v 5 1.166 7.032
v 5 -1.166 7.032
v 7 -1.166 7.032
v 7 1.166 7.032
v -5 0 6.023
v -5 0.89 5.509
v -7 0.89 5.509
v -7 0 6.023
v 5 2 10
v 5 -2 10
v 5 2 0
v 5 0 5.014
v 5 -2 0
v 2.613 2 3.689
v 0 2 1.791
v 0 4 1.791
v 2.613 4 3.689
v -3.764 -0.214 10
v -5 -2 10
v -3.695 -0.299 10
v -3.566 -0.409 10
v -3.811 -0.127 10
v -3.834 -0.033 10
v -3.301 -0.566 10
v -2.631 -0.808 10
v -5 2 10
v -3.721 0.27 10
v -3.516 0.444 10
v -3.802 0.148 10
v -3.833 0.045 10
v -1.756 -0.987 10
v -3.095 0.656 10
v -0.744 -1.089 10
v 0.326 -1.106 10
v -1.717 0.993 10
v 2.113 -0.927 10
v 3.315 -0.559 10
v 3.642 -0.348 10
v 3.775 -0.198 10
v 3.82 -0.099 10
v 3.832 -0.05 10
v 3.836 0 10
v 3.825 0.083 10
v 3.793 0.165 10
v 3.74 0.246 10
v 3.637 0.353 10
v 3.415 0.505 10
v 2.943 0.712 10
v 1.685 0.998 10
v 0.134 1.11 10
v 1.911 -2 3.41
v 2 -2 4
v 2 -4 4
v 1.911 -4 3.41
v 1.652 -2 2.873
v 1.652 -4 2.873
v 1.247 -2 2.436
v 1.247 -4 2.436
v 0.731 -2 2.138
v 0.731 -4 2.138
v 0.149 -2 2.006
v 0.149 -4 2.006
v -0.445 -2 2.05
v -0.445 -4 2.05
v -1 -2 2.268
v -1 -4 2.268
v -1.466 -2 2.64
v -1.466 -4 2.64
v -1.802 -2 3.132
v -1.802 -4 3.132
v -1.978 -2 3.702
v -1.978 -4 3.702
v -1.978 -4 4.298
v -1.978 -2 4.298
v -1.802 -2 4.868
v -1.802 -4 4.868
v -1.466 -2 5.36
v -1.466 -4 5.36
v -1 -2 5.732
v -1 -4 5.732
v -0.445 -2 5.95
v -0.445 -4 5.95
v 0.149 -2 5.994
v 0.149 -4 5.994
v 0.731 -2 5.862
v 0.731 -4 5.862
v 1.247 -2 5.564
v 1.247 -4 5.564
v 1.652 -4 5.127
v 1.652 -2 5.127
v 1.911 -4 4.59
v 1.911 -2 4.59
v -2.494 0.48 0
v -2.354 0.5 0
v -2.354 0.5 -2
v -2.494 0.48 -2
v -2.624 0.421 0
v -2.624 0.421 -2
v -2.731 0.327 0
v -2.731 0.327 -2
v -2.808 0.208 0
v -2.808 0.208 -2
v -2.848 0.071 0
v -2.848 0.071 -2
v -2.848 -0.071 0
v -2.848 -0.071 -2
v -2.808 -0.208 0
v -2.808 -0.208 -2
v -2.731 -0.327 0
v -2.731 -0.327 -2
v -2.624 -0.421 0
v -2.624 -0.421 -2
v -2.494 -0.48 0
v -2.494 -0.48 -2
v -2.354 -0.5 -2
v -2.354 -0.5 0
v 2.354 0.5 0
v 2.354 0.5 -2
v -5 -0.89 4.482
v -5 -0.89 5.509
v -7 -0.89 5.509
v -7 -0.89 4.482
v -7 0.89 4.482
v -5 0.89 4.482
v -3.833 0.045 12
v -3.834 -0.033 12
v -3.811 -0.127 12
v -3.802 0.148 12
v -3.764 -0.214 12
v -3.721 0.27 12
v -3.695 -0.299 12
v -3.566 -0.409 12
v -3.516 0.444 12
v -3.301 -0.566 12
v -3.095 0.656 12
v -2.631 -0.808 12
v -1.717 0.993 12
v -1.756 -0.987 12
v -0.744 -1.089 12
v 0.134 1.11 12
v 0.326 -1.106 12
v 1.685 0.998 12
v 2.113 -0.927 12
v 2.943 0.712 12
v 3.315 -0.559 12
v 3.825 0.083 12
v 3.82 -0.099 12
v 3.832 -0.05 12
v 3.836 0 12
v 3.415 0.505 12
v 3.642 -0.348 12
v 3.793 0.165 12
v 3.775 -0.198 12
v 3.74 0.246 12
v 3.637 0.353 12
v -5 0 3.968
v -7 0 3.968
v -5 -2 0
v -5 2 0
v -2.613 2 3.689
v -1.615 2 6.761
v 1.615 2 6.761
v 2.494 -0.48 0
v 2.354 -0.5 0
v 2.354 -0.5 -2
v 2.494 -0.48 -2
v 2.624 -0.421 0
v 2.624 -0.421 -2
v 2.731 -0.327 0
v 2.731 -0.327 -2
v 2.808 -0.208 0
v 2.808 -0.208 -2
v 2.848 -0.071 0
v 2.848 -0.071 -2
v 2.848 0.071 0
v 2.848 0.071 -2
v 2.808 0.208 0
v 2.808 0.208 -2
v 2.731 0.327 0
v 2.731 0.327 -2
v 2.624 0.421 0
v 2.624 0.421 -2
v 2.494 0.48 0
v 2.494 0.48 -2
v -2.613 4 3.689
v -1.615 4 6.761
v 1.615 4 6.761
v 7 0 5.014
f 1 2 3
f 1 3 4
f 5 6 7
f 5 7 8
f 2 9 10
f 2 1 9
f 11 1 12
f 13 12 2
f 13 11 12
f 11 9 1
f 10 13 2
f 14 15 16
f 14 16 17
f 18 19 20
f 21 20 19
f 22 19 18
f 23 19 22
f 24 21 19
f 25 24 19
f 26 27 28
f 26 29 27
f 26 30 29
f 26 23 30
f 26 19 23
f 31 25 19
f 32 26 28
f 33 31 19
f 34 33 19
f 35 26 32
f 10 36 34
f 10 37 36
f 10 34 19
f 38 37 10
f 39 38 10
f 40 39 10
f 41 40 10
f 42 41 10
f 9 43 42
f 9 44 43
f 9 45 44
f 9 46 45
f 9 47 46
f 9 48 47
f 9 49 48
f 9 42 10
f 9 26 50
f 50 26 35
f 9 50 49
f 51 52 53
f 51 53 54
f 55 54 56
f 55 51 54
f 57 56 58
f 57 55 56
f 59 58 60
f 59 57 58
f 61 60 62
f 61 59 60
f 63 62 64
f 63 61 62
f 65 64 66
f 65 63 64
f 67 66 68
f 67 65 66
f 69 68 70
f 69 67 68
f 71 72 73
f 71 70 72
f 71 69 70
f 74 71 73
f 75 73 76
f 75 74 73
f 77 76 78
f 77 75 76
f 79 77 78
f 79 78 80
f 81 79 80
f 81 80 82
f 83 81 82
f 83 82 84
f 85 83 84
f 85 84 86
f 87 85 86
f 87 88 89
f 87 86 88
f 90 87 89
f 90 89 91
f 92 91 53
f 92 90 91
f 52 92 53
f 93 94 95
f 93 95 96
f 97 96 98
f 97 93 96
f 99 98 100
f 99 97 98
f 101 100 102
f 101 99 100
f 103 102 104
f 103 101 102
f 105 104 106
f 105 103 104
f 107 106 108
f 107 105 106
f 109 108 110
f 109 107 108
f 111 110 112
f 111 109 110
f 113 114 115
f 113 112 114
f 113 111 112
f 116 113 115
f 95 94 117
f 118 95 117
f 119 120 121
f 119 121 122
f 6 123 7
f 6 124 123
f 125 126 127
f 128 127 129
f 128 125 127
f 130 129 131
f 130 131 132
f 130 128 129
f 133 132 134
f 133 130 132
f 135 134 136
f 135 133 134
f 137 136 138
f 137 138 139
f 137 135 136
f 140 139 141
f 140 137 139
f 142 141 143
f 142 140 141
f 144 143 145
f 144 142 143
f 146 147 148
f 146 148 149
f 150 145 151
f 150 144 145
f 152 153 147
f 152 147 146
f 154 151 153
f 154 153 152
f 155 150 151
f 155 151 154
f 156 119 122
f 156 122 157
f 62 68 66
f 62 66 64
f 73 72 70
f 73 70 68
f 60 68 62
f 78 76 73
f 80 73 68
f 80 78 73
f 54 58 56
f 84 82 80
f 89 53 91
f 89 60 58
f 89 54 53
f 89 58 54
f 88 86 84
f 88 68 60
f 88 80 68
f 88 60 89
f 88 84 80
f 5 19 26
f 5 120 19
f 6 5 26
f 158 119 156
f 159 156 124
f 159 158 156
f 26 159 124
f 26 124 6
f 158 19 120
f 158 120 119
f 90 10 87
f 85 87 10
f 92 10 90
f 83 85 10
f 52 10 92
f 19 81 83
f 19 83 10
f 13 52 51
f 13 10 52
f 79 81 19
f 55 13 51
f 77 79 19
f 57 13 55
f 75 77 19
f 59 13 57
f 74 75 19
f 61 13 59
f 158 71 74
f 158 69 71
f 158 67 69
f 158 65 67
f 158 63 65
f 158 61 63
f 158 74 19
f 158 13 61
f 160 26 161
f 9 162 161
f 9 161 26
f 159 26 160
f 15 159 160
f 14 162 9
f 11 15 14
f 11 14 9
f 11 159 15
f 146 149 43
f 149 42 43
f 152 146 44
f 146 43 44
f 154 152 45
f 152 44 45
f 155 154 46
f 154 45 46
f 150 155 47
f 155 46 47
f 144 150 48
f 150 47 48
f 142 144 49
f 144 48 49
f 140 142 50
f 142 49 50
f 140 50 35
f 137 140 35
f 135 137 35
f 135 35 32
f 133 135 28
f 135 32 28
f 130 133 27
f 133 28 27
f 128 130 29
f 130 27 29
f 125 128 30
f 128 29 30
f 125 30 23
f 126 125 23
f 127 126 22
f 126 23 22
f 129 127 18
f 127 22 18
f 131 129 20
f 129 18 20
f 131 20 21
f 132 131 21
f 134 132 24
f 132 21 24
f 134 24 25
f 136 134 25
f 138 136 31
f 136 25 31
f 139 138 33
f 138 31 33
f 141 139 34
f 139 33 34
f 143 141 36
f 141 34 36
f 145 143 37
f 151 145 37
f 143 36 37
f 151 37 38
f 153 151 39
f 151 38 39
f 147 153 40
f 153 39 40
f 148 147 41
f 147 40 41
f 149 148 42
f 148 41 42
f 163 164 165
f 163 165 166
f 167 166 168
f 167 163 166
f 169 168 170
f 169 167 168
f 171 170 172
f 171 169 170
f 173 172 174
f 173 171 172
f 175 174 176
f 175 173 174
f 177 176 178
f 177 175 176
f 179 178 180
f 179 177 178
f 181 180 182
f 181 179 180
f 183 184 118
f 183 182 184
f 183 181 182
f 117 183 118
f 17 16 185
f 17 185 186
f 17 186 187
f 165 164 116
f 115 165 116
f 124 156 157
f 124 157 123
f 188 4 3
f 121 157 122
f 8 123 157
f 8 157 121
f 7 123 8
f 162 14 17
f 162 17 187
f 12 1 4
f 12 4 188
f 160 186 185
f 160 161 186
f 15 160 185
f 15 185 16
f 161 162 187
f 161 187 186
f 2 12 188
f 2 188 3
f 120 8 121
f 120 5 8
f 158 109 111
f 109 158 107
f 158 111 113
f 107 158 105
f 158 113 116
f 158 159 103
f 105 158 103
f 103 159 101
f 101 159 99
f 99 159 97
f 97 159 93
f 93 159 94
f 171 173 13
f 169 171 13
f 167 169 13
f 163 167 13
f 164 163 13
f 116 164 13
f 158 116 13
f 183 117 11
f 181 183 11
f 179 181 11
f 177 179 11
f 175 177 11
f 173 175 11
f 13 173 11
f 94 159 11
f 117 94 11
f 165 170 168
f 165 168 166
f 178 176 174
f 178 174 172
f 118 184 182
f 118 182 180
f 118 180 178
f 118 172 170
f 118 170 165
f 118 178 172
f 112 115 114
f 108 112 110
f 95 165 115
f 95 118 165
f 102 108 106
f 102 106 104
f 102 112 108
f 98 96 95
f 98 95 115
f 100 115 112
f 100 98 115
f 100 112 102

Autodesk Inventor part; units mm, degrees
ref_plane "YZ Plane" through (0, 0, 0) normal (1, 0, 0) x (0, 1, 0)
ref_plane "XZ Plane" through (0, 0, 0) normal (0, 1, 0) x (-1, 0, 0)
ref_plane "XY Plane" through (0, 0, 0) normal (0, 0, 1) x (1, 0, 0)
sketch "Rechteck" plane through (0, 0, 0) normal (0, 0, 1) x (1, 0, 0)
  line L0 (-5, 2) -> (5, 2)
  line L1 (5, 2) -> (5, -2)
  line L2 (5, -2) -> (-5, -2)
  line L3 (-5, -2) -> (-5, 2)
  point P0 (0, 0)
  dimension "d0" = 5
  dimension "d1" = 10
  dimension "d2" = 4
  dimension "d3" = 2
extrude "Extrusion1" add sketch "Rechteck" along normal blind 10
sketch "Kreis" plane through (-5, -2, 0) normal (0, -1, 0) x (1, 0, 0)
  circle A0 centre (5, 4) radius 2
  point P0 (5, 0)
  dimension "d6" = 4
extrude "Extrusion2" add sketch "Kreis" along normal blind 2
sketch "Dreieck" plane through (5, -2, 0) normal (1, 0, 0) x (0, 0, -1)
  line L0 (-5.0135, 2) -> (-7.0323, 0.8344)
  line L1 (-7.0323, 0.8344) -> (-7.0323, 3.1656)
  line L2 (-7.0323, 3.1656) -> (-5.0135, 2)
  point P0 (0, 2)
  point P1 (-6.3594, 2)
extrude "Extrusion3" add sketch "Dreieck" along normal blind 2
sketch "Pentagon" plane through (-5, 2, 0) normal (0, 1, 0) x (1, 0, 0)
  line L0 (5, -1.7907) -> (7.6131, -3.6893)
  line L1 (7.6131, -3.6893) -> (6.615, -6.7612)
  line L2 (6.615, -6.7612) -> (3.385, -6.7612)
  line L3 (3.385, -6.7612) -> (2.3869, -3.6893)
  line L4 (2.3869, -3.6893) -> (5, -1.7907)
  point P0 (5, 0)
  point P1 (5, -4.5383)
extrude "Extrusion4" add sketch "Pentagon" along normal blind 2
sketch "Hexagon" plane through (-5, -2, 0) normal (-1, 0, 0) x (0, 0, 1)
  line L0 (6.0229, 2) -> (5.5093, 1.1104)
  line L1 (5.5093, 1.1104) -> (4.4821, 1.1104)
  line L2 (4.4821, 1.1104) -> (3.9685, 2)
  line L3 (3.9685, 2) -> (4.4821, 2.8896)
  line L4 (4.4821, 2.8896) -> (5.5093, 2.8896)
  line L5 (5.5093, 2.8896) -> (6.0229, 2)
  point P0 (0, 2)
  point P1 (4.9957, 2)
extrude "Extrusion5" add sketch "Hexagon" along normal blind 2
sketch "Ellipse" plane through (0, 0, 10) normal (0, 0, 1) x (1, 0, 0)
  ellipse E0 centre (0, 0) end of major axis (3.8358, 0) minor radius 1.1104
sketch "Nase" plane through (0, 0, 0) normal (0, 0, -1) x (-1, 0, 0)
  line L0 (2.3535, 0) -> (-2.3535, 0) construction
  line L1 (2.3535, 0.5) -> (-2.3535, 0.5)
  line L2 (-2.3535, -0.5) -> (2.3535, -0.5)
  arc A0 (2.3535, -0.5) -> (2.3535, 0.5) centre (2.3535, 0) ccw
  arc A1 (-2.3535, 0.5) -> (-2.3535, -0.5) centre (-2.3535, 0) ccw
  point P0 (0, 0)
  dimension "d17" = 1
extrude "Extrusion7" add sketch "Nase" along normal blind 2
extrude "Extrusion8" add sketch "Ellipse" along normal blind 2
properties part number "Demo-Status-0.3"
